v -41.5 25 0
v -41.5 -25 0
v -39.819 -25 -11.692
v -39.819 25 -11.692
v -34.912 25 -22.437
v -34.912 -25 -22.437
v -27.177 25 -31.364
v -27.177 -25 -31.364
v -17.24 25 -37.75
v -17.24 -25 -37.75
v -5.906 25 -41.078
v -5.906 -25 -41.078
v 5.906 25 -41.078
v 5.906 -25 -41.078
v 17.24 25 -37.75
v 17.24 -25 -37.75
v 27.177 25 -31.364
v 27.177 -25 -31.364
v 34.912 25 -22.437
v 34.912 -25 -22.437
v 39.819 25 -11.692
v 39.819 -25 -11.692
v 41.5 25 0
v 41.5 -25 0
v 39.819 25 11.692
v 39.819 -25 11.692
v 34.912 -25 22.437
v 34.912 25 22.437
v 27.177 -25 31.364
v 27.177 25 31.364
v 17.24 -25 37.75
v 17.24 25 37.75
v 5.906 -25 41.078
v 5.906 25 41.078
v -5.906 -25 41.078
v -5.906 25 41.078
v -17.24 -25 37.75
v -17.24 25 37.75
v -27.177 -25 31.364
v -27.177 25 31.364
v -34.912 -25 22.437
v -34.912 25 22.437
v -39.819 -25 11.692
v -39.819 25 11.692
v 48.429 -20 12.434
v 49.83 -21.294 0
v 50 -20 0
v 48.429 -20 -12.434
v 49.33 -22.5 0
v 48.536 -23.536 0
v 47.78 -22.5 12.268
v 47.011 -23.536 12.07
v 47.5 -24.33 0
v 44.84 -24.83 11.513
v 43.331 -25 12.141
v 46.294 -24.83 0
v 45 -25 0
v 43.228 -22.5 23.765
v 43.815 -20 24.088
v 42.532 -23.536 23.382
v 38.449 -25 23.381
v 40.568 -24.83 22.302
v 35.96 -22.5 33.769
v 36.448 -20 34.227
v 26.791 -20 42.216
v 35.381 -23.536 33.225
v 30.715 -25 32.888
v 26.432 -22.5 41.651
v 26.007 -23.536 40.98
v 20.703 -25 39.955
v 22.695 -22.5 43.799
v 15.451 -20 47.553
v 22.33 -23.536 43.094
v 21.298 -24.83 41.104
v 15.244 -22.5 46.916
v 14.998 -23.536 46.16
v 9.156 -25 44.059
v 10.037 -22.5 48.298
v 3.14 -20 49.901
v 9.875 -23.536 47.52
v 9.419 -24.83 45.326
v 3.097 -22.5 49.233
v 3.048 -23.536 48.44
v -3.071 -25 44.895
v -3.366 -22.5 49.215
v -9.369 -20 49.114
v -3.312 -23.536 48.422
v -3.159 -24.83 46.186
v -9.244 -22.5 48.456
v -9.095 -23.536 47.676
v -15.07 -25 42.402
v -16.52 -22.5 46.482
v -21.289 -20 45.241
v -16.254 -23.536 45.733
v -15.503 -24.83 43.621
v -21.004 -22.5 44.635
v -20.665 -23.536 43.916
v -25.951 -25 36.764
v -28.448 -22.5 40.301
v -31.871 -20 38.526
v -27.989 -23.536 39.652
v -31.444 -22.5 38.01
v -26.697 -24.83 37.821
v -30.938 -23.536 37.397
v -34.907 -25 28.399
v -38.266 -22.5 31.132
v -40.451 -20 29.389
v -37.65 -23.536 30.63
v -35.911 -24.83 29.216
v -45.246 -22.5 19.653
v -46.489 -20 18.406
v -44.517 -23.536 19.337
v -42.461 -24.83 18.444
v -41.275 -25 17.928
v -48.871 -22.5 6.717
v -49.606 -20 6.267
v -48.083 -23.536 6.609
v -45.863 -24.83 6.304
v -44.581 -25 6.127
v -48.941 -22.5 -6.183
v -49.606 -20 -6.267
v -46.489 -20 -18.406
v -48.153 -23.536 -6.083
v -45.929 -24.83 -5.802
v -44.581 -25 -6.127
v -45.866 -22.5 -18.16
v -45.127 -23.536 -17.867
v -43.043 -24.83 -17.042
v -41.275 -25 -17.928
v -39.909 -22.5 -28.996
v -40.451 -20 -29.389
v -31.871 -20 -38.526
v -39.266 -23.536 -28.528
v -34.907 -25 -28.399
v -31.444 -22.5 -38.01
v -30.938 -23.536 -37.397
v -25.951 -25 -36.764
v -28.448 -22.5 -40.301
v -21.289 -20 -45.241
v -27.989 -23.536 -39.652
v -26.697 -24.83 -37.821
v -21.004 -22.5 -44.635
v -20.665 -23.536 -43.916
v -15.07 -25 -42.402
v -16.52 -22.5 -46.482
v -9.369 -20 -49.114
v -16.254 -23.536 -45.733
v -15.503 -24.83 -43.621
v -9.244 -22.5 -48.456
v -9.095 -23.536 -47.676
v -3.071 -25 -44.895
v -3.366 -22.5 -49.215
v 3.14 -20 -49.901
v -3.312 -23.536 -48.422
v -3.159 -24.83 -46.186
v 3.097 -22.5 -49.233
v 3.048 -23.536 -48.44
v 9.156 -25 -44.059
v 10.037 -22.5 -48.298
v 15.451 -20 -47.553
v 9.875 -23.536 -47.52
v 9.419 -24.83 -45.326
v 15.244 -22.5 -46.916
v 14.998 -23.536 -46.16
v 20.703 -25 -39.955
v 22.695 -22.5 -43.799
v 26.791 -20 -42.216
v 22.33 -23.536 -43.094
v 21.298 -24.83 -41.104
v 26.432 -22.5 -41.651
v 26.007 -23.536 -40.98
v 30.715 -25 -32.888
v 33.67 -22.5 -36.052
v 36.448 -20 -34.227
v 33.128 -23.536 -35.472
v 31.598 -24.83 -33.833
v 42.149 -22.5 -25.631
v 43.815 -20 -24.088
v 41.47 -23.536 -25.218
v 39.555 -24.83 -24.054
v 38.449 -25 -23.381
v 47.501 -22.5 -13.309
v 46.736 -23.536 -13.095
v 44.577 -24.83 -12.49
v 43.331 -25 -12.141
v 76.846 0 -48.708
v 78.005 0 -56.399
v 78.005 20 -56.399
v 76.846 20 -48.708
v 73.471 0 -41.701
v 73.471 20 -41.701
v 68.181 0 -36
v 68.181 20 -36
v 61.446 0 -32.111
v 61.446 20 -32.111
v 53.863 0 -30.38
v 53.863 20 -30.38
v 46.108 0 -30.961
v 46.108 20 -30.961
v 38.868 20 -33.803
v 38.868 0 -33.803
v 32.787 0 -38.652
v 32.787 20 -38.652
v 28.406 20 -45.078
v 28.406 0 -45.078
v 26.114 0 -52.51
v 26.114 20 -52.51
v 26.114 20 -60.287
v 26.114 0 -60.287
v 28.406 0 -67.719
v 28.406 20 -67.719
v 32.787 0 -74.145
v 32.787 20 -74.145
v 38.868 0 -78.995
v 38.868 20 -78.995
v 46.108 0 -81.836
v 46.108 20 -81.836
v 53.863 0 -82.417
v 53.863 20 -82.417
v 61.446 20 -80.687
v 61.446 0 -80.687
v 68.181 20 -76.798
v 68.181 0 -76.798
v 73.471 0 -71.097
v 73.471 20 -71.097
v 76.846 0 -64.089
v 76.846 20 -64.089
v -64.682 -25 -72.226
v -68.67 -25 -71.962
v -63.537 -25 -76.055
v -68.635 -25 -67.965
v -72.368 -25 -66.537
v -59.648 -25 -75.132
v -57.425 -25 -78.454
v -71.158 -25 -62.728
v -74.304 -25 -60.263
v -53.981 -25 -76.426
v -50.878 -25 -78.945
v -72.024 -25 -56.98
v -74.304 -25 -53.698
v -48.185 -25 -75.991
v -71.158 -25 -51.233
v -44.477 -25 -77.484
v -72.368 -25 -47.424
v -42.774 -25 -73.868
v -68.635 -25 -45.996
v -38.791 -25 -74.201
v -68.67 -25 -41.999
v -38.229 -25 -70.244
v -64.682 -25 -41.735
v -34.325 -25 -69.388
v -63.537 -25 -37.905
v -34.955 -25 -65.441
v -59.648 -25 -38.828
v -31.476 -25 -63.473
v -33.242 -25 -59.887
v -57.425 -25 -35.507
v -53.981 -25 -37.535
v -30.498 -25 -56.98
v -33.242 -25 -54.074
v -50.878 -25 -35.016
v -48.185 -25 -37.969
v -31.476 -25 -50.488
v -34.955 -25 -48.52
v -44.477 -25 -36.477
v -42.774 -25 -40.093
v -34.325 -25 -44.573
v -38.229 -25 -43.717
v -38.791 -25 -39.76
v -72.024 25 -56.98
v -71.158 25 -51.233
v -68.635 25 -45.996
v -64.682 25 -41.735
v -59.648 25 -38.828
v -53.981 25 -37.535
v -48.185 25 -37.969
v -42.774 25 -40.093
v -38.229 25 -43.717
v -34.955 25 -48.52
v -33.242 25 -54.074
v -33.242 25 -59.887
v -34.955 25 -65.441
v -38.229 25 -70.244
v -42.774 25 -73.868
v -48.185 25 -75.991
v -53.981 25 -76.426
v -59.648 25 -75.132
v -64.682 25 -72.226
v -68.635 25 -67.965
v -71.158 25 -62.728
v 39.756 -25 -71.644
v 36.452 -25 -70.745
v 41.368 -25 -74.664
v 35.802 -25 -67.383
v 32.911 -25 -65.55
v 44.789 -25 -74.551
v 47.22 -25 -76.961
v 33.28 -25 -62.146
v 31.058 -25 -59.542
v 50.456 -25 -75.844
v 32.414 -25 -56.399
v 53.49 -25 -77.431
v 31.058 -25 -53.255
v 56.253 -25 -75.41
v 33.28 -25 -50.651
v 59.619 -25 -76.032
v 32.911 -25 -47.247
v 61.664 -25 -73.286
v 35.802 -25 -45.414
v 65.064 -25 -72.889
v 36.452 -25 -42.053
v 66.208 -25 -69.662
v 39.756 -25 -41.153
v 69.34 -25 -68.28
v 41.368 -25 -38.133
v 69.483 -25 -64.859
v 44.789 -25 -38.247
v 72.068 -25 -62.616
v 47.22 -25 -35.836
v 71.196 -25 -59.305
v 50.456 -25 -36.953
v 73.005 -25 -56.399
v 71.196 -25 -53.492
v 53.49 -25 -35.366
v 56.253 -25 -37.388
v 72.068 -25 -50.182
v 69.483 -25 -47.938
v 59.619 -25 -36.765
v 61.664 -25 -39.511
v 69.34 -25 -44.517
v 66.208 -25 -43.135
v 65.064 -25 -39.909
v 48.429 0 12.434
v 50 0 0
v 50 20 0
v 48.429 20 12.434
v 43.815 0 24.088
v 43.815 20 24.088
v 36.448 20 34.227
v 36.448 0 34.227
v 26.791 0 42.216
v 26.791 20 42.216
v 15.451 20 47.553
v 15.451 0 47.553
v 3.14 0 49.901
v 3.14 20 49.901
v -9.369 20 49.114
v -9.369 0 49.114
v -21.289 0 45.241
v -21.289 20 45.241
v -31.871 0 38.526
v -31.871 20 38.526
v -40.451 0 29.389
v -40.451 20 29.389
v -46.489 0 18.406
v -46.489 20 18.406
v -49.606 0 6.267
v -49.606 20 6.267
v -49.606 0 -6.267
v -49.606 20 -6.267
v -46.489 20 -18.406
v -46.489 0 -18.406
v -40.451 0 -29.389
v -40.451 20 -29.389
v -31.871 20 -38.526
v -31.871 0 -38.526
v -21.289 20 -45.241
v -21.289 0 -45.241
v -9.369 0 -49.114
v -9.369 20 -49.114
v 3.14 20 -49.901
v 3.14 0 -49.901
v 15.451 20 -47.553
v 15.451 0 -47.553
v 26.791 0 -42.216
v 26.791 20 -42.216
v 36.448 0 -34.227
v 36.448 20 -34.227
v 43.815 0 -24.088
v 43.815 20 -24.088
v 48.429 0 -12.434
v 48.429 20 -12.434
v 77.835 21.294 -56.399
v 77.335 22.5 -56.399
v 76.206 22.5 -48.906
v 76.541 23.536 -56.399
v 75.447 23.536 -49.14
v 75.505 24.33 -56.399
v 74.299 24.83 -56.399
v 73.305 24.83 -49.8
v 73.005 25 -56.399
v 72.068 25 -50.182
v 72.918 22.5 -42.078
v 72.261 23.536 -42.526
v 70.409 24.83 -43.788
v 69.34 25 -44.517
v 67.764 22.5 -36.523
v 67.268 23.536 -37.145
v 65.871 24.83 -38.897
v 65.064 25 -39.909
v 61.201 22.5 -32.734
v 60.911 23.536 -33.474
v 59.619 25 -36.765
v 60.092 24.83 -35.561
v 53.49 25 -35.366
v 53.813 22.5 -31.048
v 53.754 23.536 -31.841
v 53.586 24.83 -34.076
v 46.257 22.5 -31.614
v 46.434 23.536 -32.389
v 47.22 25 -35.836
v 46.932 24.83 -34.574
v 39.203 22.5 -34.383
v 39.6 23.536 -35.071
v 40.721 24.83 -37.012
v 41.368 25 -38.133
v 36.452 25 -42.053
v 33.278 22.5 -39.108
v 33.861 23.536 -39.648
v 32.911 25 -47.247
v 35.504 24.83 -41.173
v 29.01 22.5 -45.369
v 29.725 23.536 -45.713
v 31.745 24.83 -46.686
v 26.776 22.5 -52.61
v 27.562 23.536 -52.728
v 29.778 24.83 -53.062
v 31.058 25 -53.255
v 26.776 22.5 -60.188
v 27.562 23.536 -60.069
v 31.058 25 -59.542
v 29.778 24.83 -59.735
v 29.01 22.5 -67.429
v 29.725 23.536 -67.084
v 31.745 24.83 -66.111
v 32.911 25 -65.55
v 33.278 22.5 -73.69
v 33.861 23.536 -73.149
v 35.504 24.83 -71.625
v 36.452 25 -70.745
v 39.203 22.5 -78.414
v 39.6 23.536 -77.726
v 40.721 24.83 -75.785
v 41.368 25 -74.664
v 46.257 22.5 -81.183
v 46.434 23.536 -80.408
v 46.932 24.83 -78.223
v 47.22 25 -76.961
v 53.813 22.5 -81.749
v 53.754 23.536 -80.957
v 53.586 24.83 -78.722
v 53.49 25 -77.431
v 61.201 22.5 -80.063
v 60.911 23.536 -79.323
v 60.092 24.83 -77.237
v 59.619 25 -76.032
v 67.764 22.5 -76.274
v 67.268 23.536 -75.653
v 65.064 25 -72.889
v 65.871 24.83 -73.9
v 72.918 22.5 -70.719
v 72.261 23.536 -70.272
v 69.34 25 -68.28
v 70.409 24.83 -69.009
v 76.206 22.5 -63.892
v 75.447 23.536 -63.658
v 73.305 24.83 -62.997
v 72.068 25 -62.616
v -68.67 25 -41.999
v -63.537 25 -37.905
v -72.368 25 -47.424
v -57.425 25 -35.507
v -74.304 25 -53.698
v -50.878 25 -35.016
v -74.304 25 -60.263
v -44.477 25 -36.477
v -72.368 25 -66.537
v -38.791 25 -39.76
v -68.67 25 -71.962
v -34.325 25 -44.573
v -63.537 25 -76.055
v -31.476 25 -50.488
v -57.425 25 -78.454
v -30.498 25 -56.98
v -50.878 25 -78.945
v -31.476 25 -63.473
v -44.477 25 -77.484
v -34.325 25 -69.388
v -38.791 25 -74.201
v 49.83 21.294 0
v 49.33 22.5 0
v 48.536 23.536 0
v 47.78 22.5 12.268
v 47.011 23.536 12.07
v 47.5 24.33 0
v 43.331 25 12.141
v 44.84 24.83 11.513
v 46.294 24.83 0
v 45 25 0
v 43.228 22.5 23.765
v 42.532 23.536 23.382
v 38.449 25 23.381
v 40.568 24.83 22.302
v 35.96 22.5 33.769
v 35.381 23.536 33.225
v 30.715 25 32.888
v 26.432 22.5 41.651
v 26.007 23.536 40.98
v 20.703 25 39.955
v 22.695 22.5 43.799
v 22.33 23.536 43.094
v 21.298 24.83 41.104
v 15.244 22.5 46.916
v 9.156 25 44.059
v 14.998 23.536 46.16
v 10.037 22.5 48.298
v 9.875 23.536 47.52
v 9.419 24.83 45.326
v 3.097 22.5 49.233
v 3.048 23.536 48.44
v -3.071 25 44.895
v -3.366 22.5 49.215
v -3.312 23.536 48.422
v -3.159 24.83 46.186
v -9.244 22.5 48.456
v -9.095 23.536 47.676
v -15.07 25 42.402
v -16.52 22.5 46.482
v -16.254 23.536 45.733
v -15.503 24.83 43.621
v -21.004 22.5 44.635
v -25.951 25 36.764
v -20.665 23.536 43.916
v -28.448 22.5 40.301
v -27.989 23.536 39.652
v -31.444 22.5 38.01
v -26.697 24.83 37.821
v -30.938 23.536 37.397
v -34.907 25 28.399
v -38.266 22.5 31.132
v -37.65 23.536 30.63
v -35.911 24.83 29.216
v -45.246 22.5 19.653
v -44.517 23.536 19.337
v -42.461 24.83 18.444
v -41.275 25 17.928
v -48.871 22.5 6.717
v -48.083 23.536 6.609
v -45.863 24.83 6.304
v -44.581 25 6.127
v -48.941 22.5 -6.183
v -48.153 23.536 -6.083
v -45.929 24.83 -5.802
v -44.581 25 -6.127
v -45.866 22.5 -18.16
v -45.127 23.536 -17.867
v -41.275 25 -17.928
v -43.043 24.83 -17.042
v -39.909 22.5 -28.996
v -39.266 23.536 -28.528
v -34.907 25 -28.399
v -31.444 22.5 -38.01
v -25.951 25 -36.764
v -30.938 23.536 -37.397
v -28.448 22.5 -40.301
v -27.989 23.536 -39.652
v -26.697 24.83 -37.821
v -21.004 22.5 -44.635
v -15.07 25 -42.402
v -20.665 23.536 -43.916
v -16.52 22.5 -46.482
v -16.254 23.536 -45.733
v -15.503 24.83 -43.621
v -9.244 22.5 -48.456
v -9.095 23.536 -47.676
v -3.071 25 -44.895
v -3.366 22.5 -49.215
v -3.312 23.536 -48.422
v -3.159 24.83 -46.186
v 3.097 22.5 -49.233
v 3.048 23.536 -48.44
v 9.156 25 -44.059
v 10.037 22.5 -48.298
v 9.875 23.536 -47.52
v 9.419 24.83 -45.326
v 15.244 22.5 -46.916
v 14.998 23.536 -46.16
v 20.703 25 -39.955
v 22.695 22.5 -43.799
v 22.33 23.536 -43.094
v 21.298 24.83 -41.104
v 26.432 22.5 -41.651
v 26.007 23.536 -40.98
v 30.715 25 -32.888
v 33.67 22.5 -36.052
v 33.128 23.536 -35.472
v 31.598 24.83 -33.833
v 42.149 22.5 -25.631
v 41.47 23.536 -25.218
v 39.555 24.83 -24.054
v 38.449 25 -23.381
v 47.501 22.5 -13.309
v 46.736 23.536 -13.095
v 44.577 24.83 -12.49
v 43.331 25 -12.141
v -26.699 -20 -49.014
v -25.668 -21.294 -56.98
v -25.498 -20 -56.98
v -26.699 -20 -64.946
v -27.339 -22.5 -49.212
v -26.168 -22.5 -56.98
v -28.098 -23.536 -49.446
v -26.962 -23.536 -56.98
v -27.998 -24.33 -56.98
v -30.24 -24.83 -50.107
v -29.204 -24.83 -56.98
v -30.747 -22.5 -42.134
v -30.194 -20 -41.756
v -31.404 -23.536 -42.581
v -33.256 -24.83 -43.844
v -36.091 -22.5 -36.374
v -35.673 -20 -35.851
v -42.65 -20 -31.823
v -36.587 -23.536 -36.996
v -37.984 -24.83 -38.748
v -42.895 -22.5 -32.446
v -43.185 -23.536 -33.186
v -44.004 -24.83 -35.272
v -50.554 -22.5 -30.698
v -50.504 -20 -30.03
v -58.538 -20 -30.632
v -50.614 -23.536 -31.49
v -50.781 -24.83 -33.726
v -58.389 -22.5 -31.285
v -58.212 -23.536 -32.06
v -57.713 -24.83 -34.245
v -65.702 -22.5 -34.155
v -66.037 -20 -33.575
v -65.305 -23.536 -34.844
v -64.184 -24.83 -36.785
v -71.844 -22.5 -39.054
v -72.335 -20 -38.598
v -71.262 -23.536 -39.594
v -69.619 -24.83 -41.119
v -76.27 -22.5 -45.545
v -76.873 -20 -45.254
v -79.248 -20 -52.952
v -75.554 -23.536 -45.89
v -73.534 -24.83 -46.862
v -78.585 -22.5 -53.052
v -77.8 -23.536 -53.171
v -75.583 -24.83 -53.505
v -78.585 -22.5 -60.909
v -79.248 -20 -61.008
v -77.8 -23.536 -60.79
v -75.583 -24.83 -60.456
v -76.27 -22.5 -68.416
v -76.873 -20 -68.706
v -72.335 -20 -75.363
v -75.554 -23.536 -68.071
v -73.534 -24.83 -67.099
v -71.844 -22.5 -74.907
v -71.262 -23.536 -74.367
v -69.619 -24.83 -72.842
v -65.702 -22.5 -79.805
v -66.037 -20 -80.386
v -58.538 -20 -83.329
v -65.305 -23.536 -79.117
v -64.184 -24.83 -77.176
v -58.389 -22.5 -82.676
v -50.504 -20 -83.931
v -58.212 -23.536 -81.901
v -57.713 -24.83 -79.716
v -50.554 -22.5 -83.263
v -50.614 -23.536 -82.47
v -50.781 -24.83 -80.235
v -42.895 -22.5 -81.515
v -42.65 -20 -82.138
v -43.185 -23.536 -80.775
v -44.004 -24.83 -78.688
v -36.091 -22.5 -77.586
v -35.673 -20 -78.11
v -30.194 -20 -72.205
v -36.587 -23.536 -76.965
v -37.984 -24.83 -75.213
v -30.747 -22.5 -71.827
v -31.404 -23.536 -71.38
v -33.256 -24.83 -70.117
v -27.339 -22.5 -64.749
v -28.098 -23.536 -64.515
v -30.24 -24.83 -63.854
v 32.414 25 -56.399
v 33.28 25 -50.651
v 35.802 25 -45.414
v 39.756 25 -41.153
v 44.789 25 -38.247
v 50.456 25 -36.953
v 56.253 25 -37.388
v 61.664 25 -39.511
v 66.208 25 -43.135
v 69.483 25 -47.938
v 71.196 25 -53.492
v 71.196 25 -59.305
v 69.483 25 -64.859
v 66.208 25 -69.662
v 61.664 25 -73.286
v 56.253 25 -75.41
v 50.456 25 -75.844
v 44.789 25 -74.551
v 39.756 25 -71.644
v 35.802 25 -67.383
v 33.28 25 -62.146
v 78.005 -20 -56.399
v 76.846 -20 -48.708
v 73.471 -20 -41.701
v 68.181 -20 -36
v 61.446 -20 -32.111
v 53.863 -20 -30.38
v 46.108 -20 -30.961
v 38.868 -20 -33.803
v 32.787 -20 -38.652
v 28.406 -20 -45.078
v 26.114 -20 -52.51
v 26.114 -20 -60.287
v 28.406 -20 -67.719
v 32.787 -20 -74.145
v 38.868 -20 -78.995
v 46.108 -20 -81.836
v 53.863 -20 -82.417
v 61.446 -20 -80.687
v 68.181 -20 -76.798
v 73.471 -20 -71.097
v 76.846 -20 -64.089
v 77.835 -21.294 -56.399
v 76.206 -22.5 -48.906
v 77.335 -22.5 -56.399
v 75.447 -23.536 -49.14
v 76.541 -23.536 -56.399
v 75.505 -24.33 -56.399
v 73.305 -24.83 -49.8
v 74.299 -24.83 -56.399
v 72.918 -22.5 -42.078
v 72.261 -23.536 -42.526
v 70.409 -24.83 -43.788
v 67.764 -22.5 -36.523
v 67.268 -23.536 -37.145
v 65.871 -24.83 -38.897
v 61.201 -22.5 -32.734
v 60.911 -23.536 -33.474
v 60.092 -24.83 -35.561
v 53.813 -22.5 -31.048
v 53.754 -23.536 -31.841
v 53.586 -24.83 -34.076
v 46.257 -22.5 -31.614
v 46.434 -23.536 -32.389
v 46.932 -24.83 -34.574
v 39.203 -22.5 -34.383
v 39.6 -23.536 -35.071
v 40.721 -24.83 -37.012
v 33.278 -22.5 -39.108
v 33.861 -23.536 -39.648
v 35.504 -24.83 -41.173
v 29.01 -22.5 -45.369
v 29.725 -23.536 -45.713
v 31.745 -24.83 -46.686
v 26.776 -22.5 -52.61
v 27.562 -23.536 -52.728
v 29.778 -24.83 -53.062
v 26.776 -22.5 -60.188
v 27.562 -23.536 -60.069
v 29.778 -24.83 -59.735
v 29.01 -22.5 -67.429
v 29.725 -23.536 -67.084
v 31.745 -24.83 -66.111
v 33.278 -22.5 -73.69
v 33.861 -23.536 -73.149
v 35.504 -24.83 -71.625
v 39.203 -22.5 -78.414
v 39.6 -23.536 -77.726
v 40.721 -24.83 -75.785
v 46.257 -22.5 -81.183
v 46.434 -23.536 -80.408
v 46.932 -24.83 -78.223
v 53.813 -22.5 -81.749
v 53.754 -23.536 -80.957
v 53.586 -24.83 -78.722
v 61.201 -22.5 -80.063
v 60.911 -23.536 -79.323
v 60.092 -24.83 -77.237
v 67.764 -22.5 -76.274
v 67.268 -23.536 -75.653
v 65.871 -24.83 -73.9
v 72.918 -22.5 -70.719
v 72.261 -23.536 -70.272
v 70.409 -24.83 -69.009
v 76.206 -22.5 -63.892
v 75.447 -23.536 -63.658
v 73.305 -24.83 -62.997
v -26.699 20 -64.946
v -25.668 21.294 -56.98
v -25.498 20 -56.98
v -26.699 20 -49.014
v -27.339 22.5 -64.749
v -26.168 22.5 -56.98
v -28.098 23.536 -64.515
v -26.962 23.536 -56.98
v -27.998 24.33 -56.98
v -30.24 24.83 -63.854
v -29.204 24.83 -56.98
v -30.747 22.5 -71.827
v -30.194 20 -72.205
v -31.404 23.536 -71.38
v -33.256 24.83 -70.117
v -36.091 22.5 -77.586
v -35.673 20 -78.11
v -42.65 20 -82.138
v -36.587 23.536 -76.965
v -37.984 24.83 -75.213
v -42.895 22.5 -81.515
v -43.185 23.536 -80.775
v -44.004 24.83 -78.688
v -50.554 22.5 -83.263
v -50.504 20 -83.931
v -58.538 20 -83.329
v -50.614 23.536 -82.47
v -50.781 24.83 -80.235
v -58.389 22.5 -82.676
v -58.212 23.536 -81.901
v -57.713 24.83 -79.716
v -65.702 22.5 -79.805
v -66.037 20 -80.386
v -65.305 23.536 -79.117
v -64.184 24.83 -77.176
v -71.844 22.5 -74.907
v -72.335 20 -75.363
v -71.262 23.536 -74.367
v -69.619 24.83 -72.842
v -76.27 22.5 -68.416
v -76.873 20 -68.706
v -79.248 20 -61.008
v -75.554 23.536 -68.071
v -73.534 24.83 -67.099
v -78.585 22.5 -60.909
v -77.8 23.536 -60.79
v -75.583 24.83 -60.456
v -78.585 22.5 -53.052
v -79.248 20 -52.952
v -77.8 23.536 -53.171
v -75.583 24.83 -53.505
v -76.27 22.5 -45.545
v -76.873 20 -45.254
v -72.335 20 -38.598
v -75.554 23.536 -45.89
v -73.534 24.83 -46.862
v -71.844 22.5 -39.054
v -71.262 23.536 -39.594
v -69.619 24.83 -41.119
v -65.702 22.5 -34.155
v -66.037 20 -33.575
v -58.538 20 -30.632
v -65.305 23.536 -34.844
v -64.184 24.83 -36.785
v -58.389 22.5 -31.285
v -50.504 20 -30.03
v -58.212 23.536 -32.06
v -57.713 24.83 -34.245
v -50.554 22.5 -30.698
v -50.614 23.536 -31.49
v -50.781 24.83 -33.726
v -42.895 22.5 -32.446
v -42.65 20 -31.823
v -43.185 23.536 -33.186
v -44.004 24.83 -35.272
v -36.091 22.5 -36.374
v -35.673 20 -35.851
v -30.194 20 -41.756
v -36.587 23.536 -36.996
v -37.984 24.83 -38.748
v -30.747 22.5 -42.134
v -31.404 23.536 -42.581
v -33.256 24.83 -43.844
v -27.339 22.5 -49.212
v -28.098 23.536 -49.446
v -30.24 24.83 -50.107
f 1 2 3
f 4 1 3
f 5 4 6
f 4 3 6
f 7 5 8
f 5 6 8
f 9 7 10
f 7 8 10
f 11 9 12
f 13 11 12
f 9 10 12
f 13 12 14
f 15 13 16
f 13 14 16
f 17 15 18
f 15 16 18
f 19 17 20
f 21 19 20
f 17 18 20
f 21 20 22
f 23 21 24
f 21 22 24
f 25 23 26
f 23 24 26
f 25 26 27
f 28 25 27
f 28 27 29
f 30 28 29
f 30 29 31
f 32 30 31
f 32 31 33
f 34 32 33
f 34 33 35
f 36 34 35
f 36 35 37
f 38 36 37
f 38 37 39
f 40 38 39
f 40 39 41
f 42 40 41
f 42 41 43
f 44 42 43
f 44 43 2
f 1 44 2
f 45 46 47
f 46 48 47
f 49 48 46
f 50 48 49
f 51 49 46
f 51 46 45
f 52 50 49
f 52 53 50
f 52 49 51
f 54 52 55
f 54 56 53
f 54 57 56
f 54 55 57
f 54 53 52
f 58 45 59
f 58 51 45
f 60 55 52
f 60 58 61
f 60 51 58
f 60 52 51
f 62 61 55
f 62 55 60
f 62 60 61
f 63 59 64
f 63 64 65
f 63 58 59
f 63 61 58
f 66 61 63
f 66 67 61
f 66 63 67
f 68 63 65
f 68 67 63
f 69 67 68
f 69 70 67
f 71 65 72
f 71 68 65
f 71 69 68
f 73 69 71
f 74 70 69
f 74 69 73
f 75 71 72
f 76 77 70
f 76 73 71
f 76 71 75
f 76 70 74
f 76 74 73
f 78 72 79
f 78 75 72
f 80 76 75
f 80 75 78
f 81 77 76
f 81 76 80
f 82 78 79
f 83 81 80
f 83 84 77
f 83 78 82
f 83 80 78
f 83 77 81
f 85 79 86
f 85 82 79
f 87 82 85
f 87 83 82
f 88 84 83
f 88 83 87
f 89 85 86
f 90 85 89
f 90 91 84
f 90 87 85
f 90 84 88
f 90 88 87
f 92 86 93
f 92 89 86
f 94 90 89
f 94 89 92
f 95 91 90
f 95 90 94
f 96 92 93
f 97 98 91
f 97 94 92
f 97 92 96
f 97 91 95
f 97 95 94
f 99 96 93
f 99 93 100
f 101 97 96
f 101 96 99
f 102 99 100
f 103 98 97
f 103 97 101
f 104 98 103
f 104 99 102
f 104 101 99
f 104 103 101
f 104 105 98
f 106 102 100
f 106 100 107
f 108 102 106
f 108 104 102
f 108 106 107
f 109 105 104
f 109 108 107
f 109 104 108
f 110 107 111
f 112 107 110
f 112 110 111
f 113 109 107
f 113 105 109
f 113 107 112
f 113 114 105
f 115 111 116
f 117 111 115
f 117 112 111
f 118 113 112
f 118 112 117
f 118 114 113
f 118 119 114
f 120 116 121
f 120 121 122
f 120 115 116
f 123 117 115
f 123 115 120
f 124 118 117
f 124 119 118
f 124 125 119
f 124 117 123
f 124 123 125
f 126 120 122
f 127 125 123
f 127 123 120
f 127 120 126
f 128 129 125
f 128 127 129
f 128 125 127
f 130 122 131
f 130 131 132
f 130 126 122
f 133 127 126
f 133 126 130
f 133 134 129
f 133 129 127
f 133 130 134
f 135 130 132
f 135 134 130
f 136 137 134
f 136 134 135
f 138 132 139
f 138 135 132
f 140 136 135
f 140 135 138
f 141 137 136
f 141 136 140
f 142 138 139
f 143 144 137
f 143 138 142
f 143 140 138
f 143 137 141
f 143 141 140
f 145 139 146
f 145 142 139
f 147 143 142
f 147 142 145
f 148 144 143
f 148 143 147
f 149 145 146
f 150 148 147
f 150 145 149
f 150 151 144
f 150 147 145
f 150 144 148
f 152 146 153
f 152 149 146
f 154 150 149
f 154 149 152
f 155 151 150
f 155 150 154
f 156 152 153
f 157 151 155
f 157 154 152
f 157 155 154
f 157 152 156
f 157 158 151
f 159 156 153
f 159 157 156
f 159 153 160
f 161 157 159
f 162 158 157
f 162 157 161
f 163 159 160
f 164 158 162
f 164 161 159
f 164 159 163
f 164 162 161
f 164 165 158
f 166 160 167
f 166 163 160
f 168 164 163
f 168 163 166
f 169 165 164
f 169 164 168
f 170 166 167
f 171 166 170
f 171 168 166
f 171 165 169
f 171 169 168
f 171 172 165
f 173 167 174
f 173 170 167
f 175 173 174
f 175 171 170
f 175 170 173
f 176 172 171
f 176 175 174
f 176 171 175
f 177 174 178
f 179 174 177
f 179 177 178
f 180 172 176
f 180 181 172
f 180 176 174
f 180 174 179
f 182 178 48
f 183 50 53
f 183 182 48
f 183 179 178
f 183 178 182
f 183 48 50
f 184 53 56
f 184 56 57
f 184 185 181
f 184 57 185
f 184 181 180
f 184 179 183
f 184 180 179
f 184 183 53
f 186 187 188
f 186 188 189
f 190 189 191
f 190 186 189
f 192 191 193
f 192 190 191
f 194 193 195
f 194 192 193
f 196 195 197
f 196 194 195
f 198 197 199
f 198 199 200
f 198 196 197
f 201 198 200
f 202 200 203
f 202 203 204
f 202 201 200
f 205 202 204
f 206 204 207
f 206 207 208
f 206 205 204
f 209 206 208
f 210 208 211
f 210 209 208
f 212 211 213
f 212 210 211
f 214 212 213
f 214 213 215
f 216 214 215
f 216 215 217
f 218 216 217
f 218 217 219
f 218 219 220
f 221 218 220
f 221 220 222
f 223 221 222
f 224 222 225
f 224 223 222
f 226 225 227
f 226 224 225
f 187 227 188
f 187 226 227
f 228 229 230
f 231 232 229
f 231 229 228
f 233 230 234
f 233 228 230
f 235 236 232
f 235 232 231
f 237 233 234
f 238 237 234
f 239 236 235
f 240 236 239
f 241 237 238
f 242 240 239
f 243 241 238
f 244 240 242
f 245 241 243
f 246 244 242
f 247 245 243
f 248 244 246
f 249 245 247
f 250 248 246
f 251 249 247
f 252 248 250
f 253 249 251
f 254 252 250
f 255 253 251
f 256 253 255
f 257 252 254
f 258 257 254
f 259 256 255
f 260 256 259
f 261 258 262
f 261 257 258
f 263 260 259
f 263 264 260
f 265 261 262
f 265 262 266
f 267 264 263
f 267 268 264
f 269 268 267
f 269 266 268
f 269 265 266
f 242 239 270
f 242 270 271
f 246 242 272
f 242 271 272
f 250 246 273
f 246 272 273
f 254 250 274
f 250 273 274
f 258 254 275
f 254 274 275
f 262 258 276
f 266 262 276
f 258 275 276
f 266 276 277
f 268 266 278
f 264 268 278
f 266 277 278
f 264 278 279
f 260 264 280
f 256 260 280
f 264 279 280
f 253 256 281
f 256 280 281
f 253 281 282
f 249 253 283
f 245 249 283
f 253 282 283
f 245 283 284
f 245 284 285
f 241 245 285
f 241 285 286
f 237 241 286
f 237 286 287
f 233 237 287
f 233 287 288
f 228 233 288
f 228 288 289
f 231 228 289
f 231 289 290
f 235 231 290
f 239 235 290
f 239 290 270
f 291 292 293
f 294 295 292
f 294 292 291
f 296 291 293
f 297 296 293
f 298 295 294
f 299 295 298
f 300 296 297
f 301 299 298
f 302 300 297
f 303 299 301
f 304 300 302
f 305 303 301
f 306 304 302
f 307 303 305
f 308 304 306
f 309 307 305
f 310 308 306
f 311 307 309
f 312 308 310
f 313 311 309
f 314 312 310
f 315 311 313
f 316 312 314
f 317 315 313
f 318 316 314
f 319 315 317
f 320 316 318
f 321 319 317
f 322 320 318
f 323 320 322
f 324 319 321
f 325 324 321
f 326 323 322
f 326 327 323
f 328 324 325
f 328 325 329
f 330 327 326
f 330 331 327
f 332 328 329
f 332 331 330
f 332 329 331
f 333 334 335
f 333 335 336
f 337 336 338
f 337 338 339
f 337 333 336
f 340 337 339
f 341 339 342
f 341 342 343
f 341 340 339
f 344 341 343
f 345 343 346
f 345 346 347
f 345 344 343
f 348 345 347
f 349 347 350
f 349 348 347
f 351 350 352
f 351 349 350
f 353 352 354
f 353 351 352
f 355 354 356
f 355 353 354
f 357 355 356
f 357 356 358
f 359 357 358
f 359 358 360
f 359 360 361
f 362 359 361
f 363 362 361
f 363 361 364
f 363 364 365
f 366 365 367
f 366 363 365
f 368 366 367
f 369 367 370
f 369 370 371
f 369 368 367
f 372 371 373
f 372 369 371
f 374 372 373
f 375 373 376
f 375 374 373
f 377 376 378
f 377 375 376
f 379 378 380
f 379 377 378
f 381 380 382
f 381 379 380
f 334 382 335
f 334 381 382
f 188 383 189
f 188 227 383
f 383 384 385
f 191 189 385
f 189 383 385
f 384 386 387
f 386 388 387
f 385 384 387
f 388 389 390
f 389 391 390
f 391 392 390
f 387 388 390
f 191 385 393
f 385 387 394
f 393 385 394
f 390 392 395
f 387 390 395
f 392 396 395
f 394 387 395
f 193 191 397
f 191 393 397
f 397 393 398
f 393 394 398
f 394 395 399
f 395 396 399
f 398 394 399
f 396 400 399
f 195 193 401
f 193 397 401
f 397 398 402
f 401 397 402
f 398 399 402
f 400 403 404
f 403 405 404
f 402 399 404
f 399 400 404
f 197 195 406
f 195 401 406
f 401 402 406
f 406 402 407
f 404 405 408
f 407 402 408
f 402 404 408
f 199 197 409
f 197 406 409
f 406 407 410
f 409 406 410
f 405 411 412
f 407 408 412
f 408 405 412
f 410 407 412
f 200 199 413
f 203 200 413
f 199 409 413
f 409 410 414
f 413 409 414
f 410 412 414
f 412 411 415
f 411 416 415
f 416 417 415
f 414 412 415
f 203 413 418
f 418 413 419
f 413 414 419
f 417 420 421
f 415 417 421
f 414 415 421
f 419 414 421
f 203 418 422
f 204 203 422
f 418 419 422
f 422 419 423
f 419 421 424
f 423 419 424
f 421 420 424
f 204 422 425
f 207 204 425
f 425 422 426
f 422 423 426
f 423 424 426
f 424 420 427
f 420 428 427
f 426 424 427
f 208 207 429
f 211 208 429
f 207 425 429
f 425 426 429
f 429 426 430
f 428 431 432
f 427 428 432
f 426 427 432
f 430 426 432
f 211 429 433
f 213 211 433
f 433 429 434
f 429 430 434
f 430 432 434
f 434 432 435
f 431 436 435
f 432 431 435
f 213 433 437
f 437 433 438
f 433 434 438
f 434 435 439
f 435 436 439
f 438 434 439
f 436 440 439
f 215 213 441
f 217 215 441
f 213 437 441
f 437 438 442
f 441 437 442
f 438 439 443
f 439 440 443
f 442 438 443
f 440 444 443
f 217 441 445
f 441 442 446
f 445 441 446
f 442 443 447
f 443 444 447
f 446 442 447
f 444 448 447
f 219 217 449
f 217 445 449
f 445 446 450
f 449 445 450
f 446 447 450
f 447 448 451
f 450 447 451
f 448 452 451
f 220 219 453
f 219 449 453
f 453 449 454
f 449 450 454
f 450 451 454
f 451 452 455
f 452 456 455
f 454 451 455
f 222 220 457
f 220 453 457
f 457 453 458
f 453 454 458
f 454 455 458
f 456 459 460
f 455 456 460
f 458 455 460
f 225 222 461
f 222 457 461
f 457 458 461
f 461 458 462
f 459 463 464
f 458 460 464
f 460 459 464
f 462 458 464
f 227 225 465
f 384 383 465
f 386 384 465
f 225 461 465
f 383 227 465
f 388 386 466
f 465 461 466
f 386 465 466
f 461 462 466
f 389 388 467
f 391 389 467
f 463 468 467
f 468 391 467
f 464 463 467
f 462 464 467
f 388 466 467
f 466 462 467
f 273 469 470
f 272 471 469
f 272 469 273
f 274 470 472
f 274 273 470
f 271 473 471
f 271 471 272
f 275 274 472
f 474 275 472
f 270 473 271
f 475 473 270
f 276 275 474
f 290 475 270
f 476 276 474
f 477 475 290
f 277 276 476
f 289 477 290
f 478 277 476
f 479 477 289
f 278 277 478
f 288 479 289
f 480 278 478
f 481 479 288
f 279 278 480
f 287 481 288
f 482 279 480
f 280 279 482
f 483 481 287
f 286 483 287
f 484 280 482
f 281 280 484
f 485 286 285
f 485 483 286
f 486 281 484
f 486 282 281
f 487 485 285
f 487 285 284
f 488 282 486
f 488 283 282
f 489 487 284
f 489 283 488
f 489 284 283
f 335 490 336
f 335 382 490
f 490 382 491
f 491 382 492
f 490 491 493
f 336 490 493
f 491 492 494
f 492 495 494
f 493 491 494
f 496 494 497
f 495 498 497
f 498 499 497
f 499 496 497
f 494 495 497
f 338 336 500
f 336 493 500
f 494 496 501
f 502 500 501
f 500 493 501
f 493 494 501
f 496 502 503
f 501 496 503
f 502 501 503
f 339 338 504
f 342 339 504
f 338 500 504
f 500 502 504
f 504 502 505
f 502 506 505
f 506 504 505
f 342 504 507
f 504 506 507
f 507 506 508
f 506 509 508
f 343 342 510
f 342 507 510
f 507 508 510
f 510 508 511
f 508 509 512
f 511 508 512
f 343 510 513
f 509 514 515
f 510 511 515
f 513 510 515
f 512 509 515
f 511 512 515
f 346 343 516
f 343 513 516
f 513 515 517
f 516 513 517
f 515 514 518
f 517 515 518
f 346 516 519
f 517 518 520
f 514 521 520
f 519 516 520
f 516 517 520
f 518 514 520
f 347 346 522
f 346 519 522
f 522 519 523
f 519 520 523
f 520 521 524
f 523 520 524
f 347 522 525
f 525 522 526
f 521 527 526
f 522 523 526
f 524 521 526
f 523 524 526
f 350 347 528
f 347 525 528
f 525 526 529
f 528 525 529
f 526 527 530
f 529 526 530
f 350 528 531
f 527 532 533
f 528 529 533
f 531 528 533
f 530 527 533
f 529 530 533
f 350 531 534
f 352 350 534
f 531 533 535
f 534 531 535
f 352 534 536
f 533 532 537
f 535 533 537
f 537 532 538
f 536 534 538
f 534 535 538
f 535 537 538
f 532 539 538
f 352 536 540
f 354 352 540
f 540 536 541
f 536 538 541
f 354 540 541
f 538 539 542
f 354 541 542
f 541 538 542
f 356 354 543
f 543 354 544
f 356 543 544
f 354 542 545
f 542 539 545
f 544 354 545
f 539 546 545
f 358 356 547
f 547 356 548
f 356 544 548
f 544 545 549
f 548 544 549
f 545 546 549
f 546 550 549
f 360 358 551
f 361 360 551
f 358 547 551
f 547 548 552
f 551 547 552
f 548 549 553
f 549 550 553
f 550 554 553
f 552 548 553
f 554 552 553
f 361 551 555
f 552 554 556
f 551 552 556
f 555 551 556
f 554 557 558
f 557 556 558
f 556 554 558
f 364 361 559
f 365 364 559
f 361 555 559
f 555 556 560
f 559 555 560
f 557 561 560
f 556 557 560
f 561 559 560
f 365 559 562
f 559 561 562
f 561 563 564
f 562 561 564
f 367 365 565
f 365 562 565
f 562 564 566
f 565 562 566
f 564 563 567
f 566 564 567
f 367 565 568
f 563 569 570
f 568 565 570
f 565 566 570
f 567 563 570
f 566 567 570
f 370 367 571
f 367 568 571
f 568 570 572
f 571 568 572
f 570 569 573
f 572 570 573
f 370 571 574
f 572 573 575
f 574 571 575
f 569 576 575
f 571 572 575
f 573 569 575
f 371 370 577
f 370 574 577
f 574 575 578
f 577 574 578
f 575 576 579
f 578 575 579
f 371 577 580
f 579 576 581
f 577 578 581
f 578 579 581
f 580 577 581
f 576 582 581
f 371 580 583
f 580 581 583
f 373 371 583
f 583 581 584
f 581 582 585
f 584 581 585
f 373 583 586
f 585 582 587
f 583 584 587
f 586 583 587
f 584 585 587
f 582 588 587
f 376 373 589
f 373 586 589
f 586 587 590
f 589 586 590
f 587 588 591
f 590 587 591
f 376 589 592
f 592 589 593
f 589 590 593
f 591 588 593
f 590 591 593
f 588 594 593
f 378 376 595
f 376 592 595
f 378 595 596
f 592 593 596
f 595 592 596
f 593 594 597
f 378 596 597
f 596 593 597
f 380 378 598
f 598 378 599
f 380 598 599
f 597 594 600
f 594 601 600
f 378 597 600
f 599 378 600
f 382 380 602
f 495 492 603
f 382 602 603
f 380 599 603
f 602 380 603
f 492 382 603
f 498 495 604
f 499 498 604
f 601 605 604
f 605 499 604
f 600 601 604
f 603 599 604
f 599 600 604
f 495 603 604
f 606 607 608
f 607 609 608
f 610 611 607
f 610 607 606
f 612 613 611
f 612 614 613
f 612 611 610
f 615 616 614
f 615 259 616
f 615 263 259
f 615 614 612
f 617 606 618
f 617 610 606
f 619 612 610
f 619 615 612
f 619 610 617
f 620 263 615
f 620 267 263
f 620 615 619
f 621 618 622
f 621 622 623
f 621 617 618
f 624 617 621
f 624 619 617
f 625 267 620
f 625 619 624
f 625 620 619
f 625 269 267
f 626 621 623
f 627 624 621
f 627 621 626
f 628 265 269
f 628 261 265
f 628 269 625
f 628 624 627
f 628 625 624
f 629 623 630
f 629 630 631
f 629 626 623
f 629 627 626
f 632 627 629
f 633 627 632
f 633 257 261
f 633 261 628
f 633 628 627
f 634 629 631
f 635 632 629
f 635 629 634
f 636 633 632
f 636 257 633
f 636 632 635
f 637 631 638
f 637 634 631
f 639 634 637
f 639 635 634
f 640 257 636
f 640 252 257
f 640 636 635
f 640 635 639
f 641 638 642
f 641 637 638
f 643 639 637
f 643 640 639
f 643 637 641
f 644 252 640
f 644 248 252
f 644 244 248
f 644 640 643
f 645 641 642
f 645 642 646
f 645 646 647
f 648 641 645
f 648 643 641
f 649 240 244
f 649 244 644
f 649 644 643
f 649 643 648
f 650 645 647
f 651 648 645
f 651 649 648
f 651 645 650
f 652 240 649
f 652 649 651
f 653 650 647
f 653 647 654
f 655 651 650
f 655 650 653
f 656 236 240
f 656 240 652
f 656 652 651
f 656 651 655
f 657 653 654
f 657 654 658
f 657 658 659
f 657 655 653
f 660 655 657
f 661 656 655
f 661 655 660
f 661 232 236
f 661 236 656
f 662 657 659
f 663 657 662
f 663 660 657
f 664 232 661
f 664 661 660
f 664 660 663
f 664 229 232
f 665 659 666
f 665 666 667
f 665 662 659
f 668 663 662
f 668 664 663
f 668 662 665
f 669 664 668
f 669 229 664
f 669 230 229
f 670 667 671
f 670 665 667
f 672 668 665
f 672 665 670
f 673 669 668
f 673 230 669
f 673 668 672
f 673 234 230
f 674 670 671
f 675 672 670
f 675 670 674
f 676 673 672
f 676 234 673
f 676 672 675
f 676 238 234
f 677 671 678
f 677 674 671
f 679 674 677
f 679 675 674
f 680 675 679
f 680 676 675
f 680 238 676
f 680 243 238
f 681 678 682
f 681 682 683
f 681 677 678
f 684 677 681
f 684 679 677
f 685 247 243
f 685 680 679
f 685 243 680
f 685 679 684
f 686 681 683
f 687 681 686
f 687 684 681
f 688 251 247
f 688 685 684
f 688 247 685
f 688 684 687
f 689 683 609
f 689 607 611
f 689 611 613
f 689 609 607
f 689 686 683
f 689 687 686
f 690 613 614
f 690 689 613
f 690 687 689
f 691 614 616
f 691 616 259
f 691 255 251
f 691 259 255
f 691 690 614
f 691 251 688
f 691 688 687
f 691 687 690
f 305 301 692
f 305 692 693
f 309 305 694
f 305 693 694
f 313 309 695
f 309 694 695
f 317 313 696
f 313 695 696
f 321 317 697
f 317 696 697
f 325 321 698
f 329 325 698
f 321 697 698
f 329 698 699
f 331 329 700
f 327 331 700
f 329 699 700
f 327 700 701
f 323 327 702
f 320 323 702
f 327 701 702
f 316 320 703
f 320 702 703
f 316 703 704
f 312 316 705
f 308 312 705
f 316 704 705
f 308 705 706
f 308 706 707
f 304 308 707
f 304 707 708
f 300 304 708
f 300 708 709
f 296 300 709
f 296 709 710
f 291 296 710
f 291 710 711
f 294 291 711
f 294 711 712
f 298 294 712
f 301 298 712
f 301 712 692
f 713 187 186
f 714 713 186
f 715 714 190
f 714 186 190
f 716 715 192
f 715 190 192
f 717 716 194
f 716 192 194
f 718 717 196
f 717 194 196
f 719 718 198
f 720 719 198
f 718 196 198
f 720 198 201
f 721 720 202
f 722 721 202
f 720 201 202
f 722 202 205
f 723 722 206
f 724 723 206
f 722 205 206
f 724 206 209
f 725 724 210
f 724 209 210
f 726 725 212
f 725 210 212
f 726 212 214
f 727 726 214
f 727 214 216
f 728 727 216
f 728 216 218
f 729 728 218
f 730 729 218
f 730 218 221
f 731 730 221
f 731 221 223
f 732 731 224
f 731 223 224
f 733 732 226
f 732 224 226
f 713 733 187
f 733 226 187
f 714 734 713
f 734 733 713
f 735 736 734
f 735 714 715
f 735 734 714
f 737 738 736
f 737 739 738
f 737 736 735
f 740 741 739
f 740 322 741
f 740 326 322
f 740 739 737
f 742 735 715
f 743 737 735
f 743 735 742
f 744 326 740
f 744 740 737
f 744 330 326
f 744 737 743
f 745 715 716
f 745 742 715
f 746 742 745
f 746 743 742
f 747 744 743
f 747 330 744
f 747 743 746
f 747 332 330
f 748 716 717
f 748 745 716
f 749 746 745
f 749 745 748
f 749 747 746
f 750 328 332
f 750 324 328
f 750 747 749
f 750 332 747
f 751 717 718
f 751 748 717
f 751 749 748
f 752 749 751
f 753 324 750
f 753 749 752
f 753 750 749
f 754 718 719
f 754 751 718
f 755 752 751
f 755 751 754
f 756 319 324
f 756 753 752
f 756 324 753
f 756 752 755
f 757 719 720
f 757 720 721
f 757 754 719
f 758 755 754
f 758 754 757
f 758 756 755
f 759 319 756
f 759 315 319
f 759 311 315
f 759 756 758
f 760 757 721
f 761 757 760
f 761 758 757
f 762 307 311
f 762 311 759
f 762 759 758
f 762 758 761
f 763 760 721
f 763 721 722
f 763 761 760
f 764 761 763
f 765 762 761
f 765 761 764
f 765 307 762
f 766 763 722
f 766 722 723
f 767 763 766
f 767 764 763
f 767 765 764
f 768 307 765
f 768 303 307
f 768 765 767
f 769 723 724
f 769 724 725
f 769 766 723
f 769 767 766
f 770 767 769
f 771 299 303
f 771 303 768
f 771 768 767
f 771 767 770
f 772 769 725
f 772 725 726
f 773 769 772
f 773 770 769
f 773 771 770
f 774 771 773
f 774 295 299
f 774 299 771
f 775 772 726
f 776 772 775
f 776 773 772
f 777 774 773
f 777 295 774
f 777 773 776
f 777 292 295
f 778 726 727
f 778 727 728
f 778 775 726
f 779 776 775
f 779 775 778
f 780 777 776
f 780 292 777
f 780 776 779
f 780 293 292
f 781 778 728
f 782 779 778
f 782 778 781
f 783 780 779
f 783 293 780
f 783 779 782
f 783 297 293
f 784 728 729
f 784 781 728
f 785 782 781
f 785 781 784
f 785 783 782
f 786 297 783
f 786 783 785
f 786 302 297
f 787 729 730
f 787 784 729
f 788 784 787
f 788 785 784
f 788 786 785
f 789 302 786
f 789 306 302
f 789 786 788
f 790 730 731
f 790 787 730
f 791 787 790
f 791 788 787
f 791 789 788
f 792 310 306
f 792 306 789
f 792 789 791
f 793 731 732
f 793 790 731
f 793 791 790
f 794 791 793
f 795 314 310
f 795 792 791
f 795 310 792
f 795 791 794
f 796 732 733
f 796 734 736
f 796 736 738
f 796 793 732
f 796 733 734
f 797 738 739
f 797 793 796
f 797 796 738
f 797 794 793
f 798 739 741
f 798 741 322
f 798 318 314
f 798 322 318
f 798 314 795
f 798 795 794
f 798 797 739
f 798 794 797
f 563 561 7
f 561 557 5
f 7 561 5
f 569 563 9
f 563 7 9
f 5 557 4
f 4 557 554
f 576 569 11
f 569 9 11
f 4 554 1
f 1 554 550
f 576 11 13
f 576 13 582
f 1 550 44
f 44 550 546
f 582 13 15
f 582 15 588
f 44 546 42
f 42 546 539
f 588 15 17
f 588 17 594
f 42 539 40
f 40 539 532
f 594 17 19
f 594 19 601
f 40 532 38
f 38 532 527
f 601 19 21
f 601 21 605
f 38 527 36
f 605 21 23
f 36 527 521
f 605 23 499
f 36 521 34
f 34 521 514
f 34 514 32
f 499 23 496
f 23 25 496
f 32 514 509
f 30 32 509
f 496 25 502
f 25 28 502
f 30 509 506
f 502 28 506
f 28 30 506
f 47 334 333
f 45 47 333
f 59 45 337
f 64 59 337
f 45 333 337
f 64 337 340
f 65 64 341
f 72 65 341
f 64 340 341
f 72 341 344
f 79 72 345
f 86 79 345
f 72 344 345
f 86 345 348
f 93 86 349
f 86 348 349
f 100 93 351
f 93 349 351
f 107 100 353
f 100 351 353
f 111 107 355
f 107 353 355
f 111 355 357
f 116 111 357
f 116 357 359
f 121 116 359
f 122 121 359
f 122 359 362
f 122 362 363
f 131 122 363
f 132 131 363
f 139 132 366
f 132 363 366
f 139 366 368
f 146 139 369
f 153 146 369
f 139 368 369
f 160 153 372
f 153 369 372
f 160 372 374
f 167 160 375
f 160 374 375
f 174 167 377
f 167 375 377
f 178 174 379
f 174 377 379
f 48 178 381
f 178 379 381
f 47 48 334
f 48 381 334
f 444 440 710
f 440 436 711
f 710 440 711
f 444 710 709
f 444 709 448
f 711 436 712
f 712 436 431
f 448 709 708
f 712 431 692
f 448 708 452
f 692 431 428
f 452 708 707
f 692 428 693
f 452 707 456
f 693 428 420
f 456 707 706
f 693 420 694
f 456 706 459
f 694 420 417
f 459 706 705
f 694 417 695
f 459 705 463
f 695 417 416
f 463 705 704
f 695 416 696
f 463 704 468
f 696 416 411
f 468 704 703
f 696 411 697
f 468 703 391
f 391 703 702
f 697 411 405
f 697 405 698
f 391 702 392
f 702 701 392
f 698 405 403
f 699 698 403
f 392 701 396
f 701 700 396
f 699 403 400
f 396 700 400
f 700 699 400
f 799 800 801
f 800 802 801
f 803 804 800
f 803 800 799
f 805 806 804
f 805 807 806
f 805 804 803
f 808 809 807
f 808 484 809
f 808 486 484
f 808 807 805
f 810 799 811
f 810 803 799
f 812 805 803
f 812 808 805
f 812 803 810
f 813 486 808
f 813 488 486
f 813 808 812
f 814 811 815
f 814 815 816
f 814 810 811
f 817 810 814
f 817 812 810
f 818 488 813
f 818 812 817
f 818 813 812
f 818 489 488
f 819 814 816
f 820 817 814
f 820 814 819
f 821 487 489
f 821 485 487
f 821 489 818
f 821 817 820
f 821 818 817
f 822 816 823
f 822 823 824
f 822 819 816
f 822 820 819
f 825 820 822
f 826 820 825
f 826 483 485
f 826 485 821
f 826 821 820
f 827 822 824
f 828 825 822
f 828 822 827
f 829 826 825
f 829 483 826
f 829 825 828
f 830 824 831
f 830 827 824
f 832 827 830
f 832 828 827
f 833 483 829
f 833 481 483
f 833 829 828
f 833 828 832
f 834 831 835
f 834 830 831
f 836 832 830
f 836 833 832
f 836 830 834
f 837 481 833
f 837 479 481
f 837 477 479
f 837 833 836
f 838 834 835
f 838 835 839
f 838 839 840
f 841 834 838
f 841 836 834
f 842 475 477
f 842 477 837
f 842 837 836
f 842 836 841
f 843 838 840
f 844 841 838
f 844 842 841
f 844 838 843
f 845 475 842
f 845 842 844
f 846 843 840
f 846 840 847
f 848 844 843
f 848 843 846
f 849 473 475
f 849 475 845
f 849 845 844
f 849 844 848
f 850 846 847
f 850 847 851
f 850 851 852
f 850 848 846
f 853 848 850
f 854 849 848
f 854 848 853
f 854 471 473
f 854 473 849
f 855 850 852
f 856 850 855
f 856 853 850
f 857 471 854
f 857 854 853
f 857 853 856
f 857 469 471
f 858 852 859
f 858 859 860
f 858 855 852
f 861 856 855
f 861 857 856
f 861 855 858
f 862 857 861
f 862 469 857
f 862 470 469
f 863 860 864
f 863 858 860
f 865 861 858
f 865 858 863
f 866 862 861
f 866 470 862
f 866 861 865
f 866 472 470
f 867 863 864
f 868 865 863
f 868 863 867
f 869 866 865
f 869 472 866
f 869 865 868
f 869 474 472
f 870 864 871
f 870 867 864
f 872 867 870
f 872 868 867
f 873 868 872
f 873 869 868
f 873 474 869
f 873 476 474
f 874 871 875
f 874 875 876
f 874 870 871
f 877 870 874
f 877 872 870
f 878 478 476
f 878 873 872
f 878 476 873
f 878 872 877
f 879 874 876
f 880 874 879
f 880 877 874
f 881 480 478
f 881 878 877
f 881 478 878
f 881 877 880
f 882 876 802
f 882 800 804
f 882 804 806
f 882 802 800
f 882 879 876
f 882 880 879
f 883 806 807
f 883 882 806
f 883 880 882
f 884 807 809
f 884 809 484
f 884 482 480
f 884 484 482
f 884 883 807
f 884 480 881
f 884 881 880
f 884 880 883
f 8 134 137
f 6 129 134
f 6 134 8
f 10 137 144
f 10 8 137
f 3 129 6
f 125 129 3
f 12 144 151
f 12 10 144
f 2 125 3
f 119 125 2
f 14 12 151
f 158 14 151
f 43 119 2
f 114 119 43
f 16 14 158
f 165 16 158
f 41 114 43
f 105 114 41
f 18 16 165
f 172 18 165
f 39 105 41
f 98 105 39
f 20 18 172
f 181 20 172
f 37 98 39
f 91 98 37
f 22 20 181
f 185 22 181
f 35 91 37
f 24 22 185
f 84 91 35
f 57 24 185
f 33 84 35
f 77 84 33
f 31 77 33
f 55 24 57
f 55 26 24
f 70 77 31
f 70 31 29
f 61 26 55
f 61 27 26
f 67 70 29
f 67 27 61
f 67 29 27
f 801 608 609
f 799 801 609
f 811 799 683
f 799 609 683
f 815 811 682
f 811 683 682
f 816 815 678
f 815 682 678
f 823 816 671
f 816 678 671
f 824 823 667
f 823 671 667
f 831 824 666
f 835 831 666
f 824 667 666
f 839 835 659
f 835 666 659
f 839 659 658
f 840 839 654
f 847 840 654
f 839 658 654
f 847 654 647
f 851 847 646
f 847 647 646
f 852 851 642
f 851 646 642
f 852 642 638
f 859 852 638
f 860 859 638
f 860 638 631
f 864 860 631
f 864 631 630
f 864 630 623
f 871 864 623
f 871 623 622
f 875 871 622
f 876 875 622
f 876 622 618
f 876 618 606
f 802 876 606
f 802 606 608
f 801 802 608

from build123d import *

# Parameters (mm, degrees)
F0_R      = 50
F1_DEPTH  = 25
F1_FACE_R = 50
F2_DEPTH  = 25
F3_R      = 5
F4_R      = 26.0915
F5_DEPTH  = 25
F5_FACE_R = 26.0915
F6_DEPTH  = 25
F7_R      = 27.025882
F8_DEPTH  = 25
F8_FACE_R = 27.025882
F9_DEPTH  = 25
F10_R     = 5
F10_2_R   = 5
F12_D     = 83
F12_DEPTH = 125
F14_D     = 83
F14_DEPTH = 125
F16_D     = 39
F16_DEPTH = 50
F18_D     = 39
F18_DEPTH = 50


with BuildPart() as f1:
    # F0 (on Front) → F1 (new body)
    with BuildSketch(Plane.XZ):
        Circle(F0_R)
    extrude(amount=-F1_DEPTH)

    # F1_face (on face) → F2 (join)
    with BuildSketch(Plane.XZ):
        Circle(F1_FACE_R)
    extrude(amount=F2_DEPTH)

    # F3
    f3_edges = [f1.edges().sort_by_distance(p)[0] for p in [
        (-50, 25, 0),
        (-50, -25, 0),
    ]]
    fillet(f3_edges, radius=F3_R)

    # F12
    with Locations(Plane(origin=(0, 0, 0), x_dir=(1, 0, 0), z_dir=(0, 1, 0))):
        with Locations((0, 0)):
            Hole(F12_D / 2, depth=F12_DEPTH)

    # F14
    with Locations(Plane.XZ):
        with Locations((0, 0)):
            Hole(F14_D / 2, depth=F14_DEPTH)


with BuildPart() as f5:
    # F4 (on Front) → F5 (new body)
    with BuildSketch(Plane.XZ):
        with Locations((51.913615, -56.398716)):
            Circle(F4_R)
    extrude(amount=-F5_DEPTH)

    # F5_face (on face) → F6 (join)
    with BuildSketch(Plane(origin=(51.913615, 0, -56.398716), x_dir=(1, 0, 0), z_dir=(0, -1, 0))):
        Circle(F5_FACE_R)
    extrude(amount=F6_DEPTH)

    # F10
    f10_edges = [f5.edges().sort_by_distance(p)[0] for p in [
        (25.822115, -25, -56.398716),
        (25.822115, 25, -56.398716),
    ]]
    fillet(f10_edges, radius=F10_R)

    # F18
    with Locations(Plane.XZ.offset(25)):
        with Locations((51.913615, -56.398716)):
            Hole(F18_D / 2, depth=F18_DEPTH)


with BuildPart() as f8:
    # F7 (on Front) → F8 (new body)
    with BuildSketch(Plane.XZ):
        with Locations((-52.523833, -56.980401)):
            Circle(F7_R)
    extrude(amount=F8_DEPTH)

    # F8_face (on face) → F9 (join)
    with BuildSketch(Plane(origin=(-52.523833, 0, -56.980401), x_dir=(1, 0, 0), z_dir=(0, 1, 0))):
        Circle(F8_FACE_R)
    extrude(amount=F9_DEPTH)

    # F10#2
    f10_2_edges = [f8.edges().sort_by_distance(p)[0] for p in [
        (-79.549715, -25, -56.980401),
        (-79.549715, 25, -56.980401),
    ]]
    fillet(f10_2_edges, radius=F10_2_R)

    # F16
    with Locations(Plane.XZ.offset(25)):
        with Locations((-52.523833, -56.980401)):
            Hole(F16_D / 2, depth=F16_DEPTH)


solid = Compound([f1.part, f5.part, f8.part])
